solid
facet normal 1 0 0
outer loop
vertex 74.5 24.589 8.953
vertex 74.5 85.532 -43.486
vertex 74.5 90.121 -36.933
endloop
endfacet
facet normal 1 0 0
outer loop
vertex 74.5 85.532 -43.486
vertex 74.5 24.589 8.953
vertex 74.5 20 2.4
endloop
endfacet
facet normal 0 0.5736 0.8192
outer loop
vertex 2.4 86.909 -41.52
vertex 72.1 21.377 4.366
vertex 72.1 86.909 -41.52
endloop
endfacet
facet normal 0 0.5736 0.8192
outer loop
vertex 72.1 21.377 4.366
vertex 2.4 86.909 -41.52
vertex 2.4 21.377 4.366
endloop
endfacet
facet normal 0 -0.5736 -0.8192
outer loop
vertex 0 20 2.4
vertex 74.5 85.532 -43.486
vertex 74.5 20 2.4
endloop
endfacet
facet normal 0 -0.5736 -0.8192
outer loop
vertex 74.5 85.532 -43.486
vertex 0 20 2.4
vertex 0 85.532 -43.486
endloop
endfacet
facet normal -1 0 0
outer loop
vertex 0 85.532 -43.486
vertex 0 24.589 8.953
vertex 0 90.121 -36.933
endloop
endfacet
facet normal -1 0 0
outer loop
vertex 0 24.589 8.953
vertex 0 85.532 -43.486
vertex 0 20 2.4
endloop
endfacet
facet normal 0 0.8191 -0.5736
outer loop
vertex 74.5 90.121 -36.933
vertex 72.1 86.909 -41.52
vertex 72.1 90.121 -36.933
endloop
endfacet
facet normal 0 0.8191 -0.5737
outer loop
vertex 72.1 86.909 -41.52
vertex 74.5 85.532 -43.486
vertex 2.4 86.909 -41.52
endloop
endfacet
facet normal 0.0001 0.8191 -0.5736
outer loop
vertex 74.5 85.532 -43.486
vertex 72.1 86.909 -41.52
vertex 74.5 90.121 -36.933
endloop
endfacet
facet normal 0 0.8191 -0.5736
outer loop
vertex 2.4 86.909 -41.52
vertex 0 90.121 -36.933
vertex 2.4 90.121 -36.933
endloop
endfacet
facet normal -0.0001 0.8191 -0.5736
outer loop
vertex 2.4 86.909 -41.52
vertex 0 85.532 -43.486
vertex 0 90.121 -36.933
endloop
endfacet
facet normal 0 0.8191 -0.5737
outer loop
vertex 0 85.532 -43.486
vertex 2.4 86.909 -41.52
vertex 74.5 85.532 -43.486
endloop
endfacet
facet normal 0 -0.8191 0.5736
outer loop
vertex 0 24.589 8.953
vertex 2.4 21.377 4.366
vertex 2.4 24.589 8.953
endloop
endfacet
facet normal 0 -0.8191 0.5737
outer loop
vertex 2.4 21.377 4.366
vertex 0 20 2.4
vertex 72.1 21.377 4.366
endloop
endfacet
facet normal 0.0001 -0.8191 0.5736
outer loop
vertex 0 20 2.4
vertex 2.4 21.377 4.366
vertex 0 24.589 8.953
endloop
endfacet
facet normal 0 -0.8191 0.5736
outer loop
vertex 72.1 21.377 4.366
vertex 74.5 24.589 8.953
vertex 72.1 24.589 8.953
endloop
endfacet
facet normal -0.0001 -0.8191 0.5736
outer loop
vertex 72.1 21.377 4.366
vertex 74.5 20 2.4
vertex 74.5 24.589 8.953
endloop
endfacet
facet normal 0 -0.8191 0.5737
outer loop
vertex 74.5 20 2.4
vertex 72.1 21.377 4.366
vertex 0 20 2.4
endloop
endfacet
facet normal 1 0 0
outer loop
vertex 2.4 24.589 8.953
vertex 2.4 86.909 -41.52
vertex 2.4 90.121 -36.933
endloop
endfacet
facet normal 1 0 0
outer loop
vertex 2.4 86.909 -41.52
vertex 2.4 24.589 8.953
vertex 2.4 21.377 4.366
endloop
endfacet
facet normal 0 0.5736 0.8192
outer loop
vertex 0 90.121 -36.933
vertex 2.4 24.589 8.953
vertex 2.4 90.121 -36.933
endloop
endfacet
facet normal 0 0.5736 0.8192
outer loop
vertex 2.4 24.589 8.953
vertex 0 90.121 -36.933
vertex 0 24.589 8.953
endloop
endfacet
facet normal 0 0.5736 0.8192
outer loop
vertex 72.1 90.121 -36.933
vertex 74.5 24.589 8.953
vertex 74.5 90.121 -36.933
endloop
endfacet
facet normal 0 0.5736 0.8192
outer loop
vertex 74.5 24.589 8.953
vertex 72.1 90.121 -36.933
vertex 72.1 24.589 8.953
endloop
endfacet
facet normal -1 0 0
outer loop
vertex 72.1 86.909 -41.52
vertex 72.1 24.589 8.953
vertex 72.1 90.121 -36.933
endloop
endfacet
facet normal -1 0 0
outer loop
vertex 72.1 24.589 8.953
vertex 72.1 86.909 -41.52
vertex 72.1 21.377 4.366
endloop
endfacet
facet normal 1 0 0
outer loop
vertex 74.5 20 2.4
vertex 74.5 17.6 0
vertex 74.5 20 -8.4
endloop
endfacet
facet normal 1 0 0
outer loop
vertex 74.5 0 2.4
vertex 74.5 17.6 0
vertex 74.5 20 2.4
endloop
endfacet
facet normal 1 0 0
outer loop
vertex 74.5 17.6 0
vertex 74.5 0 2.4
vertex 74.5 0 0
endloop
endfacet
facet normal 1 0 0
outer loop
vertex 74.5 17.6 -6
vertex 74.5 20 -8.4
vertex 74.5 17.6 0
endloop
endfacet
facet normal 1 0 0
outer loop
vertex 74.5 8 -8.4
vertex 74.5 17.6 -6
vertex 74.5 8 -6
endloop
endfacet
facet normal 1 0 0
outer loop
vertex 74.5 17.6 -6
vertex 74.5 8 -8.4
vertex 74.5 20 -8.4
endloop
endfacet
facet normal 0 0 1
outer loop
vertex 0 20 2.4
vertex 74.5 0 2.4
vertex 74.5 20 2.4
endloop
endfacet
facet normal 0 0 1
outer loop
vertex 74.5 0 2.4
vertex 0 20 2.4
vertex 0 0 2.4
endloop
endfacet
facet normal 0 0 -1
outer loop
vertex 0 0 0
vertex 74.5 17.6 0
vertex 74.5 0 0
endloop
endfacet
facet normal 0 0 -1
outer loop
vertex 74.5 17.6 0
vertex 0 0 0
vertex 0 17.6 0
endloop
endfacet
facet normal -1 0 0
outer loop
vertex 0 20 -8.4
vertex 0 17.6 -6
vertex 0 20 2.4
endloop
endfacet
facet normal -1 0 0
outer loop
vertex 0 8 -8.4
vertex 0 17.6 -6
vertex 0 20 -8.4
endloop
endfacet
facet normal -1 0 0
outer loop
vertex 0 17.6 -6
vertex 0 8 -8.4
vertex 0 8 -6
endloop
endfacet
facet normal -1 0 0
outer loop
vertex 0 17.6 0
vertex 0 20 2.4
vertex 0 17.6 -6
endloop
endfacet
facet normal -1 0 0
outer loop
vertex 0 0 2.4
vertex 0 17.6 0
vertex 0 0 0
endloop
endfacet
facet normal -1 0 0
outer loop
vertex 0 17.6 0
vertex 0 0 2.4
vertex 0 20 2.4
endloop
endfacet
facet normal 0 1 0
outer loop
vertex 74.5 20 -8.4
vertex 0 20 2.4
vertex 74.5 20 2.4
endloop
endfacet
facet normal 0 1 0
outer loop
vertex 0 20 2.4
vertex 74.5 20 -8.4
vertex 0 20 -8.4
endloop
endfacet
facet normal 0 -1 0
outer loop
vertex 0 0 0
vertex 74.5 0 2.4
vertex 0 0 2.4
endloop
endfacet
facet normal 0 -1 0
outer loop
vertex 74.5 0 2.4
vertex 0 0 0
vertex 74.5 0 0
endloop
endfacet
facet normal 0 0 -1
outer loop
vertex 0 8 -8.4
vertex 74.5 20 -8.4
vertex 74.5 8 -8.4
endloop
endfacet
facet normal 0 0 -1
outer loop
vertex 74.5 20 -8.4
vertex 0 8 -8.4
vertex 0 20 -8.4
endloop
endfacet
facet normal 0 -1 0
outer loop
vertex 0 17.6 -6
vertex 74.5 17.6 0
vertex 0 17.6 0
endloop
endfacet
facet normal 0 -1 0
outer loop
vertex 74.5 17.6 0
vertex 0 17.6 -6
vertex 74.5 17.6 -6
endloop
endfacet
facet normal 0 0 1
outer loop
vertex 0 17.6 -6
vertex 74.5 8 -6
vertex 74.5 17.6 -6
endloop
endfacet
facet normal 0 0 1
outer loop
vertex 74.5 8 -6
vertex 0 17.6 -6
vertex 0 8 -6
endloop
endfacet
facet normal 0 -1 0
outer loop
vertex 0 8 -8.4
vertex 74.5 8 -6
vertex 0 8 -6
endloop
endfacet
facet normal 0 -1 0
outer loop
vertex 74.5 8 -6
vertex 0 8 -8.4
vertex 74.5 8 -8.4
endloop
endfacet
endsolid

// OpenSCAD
// Discard chute: hooks over the bed's front edge; the magnet drags a card onto it and it slides off into a
// tray, so graveyard and exile take no bed space. Units: mm.
card_w   = 66.5;       // double-sleeved
bed_t    = 6;          // bed + build plate thickness at the edge: measure it
wall     = 2.4;
ramp_l   = 80;
angle    = 35;         // steeper slides better; sleeves are slippery
w = card_w + 8;

union() {
    // the hook over the bed edge
    cube([w, 20, wall]);                                          // on top of the bed
    translate([0, 20 - wall, -bed_t - wall]) cube([w, wall, bed_t + 2 * wall]);   // front face
    translate([0, 8, -bed_t - wall]) cube([w, 12, wall]);         // under the bed
    // the ramp, down and away from the bed
    translate([0, 20, wall]) rotate([-angle, 0, 0]) union() {
        cube([w, ramp_l, wall]);
        cube([wall, ramp_l, 8]); translate([w - wall, 0, 0]) cube([wall, ramp_l, 8]);   // side rails
    }
}
